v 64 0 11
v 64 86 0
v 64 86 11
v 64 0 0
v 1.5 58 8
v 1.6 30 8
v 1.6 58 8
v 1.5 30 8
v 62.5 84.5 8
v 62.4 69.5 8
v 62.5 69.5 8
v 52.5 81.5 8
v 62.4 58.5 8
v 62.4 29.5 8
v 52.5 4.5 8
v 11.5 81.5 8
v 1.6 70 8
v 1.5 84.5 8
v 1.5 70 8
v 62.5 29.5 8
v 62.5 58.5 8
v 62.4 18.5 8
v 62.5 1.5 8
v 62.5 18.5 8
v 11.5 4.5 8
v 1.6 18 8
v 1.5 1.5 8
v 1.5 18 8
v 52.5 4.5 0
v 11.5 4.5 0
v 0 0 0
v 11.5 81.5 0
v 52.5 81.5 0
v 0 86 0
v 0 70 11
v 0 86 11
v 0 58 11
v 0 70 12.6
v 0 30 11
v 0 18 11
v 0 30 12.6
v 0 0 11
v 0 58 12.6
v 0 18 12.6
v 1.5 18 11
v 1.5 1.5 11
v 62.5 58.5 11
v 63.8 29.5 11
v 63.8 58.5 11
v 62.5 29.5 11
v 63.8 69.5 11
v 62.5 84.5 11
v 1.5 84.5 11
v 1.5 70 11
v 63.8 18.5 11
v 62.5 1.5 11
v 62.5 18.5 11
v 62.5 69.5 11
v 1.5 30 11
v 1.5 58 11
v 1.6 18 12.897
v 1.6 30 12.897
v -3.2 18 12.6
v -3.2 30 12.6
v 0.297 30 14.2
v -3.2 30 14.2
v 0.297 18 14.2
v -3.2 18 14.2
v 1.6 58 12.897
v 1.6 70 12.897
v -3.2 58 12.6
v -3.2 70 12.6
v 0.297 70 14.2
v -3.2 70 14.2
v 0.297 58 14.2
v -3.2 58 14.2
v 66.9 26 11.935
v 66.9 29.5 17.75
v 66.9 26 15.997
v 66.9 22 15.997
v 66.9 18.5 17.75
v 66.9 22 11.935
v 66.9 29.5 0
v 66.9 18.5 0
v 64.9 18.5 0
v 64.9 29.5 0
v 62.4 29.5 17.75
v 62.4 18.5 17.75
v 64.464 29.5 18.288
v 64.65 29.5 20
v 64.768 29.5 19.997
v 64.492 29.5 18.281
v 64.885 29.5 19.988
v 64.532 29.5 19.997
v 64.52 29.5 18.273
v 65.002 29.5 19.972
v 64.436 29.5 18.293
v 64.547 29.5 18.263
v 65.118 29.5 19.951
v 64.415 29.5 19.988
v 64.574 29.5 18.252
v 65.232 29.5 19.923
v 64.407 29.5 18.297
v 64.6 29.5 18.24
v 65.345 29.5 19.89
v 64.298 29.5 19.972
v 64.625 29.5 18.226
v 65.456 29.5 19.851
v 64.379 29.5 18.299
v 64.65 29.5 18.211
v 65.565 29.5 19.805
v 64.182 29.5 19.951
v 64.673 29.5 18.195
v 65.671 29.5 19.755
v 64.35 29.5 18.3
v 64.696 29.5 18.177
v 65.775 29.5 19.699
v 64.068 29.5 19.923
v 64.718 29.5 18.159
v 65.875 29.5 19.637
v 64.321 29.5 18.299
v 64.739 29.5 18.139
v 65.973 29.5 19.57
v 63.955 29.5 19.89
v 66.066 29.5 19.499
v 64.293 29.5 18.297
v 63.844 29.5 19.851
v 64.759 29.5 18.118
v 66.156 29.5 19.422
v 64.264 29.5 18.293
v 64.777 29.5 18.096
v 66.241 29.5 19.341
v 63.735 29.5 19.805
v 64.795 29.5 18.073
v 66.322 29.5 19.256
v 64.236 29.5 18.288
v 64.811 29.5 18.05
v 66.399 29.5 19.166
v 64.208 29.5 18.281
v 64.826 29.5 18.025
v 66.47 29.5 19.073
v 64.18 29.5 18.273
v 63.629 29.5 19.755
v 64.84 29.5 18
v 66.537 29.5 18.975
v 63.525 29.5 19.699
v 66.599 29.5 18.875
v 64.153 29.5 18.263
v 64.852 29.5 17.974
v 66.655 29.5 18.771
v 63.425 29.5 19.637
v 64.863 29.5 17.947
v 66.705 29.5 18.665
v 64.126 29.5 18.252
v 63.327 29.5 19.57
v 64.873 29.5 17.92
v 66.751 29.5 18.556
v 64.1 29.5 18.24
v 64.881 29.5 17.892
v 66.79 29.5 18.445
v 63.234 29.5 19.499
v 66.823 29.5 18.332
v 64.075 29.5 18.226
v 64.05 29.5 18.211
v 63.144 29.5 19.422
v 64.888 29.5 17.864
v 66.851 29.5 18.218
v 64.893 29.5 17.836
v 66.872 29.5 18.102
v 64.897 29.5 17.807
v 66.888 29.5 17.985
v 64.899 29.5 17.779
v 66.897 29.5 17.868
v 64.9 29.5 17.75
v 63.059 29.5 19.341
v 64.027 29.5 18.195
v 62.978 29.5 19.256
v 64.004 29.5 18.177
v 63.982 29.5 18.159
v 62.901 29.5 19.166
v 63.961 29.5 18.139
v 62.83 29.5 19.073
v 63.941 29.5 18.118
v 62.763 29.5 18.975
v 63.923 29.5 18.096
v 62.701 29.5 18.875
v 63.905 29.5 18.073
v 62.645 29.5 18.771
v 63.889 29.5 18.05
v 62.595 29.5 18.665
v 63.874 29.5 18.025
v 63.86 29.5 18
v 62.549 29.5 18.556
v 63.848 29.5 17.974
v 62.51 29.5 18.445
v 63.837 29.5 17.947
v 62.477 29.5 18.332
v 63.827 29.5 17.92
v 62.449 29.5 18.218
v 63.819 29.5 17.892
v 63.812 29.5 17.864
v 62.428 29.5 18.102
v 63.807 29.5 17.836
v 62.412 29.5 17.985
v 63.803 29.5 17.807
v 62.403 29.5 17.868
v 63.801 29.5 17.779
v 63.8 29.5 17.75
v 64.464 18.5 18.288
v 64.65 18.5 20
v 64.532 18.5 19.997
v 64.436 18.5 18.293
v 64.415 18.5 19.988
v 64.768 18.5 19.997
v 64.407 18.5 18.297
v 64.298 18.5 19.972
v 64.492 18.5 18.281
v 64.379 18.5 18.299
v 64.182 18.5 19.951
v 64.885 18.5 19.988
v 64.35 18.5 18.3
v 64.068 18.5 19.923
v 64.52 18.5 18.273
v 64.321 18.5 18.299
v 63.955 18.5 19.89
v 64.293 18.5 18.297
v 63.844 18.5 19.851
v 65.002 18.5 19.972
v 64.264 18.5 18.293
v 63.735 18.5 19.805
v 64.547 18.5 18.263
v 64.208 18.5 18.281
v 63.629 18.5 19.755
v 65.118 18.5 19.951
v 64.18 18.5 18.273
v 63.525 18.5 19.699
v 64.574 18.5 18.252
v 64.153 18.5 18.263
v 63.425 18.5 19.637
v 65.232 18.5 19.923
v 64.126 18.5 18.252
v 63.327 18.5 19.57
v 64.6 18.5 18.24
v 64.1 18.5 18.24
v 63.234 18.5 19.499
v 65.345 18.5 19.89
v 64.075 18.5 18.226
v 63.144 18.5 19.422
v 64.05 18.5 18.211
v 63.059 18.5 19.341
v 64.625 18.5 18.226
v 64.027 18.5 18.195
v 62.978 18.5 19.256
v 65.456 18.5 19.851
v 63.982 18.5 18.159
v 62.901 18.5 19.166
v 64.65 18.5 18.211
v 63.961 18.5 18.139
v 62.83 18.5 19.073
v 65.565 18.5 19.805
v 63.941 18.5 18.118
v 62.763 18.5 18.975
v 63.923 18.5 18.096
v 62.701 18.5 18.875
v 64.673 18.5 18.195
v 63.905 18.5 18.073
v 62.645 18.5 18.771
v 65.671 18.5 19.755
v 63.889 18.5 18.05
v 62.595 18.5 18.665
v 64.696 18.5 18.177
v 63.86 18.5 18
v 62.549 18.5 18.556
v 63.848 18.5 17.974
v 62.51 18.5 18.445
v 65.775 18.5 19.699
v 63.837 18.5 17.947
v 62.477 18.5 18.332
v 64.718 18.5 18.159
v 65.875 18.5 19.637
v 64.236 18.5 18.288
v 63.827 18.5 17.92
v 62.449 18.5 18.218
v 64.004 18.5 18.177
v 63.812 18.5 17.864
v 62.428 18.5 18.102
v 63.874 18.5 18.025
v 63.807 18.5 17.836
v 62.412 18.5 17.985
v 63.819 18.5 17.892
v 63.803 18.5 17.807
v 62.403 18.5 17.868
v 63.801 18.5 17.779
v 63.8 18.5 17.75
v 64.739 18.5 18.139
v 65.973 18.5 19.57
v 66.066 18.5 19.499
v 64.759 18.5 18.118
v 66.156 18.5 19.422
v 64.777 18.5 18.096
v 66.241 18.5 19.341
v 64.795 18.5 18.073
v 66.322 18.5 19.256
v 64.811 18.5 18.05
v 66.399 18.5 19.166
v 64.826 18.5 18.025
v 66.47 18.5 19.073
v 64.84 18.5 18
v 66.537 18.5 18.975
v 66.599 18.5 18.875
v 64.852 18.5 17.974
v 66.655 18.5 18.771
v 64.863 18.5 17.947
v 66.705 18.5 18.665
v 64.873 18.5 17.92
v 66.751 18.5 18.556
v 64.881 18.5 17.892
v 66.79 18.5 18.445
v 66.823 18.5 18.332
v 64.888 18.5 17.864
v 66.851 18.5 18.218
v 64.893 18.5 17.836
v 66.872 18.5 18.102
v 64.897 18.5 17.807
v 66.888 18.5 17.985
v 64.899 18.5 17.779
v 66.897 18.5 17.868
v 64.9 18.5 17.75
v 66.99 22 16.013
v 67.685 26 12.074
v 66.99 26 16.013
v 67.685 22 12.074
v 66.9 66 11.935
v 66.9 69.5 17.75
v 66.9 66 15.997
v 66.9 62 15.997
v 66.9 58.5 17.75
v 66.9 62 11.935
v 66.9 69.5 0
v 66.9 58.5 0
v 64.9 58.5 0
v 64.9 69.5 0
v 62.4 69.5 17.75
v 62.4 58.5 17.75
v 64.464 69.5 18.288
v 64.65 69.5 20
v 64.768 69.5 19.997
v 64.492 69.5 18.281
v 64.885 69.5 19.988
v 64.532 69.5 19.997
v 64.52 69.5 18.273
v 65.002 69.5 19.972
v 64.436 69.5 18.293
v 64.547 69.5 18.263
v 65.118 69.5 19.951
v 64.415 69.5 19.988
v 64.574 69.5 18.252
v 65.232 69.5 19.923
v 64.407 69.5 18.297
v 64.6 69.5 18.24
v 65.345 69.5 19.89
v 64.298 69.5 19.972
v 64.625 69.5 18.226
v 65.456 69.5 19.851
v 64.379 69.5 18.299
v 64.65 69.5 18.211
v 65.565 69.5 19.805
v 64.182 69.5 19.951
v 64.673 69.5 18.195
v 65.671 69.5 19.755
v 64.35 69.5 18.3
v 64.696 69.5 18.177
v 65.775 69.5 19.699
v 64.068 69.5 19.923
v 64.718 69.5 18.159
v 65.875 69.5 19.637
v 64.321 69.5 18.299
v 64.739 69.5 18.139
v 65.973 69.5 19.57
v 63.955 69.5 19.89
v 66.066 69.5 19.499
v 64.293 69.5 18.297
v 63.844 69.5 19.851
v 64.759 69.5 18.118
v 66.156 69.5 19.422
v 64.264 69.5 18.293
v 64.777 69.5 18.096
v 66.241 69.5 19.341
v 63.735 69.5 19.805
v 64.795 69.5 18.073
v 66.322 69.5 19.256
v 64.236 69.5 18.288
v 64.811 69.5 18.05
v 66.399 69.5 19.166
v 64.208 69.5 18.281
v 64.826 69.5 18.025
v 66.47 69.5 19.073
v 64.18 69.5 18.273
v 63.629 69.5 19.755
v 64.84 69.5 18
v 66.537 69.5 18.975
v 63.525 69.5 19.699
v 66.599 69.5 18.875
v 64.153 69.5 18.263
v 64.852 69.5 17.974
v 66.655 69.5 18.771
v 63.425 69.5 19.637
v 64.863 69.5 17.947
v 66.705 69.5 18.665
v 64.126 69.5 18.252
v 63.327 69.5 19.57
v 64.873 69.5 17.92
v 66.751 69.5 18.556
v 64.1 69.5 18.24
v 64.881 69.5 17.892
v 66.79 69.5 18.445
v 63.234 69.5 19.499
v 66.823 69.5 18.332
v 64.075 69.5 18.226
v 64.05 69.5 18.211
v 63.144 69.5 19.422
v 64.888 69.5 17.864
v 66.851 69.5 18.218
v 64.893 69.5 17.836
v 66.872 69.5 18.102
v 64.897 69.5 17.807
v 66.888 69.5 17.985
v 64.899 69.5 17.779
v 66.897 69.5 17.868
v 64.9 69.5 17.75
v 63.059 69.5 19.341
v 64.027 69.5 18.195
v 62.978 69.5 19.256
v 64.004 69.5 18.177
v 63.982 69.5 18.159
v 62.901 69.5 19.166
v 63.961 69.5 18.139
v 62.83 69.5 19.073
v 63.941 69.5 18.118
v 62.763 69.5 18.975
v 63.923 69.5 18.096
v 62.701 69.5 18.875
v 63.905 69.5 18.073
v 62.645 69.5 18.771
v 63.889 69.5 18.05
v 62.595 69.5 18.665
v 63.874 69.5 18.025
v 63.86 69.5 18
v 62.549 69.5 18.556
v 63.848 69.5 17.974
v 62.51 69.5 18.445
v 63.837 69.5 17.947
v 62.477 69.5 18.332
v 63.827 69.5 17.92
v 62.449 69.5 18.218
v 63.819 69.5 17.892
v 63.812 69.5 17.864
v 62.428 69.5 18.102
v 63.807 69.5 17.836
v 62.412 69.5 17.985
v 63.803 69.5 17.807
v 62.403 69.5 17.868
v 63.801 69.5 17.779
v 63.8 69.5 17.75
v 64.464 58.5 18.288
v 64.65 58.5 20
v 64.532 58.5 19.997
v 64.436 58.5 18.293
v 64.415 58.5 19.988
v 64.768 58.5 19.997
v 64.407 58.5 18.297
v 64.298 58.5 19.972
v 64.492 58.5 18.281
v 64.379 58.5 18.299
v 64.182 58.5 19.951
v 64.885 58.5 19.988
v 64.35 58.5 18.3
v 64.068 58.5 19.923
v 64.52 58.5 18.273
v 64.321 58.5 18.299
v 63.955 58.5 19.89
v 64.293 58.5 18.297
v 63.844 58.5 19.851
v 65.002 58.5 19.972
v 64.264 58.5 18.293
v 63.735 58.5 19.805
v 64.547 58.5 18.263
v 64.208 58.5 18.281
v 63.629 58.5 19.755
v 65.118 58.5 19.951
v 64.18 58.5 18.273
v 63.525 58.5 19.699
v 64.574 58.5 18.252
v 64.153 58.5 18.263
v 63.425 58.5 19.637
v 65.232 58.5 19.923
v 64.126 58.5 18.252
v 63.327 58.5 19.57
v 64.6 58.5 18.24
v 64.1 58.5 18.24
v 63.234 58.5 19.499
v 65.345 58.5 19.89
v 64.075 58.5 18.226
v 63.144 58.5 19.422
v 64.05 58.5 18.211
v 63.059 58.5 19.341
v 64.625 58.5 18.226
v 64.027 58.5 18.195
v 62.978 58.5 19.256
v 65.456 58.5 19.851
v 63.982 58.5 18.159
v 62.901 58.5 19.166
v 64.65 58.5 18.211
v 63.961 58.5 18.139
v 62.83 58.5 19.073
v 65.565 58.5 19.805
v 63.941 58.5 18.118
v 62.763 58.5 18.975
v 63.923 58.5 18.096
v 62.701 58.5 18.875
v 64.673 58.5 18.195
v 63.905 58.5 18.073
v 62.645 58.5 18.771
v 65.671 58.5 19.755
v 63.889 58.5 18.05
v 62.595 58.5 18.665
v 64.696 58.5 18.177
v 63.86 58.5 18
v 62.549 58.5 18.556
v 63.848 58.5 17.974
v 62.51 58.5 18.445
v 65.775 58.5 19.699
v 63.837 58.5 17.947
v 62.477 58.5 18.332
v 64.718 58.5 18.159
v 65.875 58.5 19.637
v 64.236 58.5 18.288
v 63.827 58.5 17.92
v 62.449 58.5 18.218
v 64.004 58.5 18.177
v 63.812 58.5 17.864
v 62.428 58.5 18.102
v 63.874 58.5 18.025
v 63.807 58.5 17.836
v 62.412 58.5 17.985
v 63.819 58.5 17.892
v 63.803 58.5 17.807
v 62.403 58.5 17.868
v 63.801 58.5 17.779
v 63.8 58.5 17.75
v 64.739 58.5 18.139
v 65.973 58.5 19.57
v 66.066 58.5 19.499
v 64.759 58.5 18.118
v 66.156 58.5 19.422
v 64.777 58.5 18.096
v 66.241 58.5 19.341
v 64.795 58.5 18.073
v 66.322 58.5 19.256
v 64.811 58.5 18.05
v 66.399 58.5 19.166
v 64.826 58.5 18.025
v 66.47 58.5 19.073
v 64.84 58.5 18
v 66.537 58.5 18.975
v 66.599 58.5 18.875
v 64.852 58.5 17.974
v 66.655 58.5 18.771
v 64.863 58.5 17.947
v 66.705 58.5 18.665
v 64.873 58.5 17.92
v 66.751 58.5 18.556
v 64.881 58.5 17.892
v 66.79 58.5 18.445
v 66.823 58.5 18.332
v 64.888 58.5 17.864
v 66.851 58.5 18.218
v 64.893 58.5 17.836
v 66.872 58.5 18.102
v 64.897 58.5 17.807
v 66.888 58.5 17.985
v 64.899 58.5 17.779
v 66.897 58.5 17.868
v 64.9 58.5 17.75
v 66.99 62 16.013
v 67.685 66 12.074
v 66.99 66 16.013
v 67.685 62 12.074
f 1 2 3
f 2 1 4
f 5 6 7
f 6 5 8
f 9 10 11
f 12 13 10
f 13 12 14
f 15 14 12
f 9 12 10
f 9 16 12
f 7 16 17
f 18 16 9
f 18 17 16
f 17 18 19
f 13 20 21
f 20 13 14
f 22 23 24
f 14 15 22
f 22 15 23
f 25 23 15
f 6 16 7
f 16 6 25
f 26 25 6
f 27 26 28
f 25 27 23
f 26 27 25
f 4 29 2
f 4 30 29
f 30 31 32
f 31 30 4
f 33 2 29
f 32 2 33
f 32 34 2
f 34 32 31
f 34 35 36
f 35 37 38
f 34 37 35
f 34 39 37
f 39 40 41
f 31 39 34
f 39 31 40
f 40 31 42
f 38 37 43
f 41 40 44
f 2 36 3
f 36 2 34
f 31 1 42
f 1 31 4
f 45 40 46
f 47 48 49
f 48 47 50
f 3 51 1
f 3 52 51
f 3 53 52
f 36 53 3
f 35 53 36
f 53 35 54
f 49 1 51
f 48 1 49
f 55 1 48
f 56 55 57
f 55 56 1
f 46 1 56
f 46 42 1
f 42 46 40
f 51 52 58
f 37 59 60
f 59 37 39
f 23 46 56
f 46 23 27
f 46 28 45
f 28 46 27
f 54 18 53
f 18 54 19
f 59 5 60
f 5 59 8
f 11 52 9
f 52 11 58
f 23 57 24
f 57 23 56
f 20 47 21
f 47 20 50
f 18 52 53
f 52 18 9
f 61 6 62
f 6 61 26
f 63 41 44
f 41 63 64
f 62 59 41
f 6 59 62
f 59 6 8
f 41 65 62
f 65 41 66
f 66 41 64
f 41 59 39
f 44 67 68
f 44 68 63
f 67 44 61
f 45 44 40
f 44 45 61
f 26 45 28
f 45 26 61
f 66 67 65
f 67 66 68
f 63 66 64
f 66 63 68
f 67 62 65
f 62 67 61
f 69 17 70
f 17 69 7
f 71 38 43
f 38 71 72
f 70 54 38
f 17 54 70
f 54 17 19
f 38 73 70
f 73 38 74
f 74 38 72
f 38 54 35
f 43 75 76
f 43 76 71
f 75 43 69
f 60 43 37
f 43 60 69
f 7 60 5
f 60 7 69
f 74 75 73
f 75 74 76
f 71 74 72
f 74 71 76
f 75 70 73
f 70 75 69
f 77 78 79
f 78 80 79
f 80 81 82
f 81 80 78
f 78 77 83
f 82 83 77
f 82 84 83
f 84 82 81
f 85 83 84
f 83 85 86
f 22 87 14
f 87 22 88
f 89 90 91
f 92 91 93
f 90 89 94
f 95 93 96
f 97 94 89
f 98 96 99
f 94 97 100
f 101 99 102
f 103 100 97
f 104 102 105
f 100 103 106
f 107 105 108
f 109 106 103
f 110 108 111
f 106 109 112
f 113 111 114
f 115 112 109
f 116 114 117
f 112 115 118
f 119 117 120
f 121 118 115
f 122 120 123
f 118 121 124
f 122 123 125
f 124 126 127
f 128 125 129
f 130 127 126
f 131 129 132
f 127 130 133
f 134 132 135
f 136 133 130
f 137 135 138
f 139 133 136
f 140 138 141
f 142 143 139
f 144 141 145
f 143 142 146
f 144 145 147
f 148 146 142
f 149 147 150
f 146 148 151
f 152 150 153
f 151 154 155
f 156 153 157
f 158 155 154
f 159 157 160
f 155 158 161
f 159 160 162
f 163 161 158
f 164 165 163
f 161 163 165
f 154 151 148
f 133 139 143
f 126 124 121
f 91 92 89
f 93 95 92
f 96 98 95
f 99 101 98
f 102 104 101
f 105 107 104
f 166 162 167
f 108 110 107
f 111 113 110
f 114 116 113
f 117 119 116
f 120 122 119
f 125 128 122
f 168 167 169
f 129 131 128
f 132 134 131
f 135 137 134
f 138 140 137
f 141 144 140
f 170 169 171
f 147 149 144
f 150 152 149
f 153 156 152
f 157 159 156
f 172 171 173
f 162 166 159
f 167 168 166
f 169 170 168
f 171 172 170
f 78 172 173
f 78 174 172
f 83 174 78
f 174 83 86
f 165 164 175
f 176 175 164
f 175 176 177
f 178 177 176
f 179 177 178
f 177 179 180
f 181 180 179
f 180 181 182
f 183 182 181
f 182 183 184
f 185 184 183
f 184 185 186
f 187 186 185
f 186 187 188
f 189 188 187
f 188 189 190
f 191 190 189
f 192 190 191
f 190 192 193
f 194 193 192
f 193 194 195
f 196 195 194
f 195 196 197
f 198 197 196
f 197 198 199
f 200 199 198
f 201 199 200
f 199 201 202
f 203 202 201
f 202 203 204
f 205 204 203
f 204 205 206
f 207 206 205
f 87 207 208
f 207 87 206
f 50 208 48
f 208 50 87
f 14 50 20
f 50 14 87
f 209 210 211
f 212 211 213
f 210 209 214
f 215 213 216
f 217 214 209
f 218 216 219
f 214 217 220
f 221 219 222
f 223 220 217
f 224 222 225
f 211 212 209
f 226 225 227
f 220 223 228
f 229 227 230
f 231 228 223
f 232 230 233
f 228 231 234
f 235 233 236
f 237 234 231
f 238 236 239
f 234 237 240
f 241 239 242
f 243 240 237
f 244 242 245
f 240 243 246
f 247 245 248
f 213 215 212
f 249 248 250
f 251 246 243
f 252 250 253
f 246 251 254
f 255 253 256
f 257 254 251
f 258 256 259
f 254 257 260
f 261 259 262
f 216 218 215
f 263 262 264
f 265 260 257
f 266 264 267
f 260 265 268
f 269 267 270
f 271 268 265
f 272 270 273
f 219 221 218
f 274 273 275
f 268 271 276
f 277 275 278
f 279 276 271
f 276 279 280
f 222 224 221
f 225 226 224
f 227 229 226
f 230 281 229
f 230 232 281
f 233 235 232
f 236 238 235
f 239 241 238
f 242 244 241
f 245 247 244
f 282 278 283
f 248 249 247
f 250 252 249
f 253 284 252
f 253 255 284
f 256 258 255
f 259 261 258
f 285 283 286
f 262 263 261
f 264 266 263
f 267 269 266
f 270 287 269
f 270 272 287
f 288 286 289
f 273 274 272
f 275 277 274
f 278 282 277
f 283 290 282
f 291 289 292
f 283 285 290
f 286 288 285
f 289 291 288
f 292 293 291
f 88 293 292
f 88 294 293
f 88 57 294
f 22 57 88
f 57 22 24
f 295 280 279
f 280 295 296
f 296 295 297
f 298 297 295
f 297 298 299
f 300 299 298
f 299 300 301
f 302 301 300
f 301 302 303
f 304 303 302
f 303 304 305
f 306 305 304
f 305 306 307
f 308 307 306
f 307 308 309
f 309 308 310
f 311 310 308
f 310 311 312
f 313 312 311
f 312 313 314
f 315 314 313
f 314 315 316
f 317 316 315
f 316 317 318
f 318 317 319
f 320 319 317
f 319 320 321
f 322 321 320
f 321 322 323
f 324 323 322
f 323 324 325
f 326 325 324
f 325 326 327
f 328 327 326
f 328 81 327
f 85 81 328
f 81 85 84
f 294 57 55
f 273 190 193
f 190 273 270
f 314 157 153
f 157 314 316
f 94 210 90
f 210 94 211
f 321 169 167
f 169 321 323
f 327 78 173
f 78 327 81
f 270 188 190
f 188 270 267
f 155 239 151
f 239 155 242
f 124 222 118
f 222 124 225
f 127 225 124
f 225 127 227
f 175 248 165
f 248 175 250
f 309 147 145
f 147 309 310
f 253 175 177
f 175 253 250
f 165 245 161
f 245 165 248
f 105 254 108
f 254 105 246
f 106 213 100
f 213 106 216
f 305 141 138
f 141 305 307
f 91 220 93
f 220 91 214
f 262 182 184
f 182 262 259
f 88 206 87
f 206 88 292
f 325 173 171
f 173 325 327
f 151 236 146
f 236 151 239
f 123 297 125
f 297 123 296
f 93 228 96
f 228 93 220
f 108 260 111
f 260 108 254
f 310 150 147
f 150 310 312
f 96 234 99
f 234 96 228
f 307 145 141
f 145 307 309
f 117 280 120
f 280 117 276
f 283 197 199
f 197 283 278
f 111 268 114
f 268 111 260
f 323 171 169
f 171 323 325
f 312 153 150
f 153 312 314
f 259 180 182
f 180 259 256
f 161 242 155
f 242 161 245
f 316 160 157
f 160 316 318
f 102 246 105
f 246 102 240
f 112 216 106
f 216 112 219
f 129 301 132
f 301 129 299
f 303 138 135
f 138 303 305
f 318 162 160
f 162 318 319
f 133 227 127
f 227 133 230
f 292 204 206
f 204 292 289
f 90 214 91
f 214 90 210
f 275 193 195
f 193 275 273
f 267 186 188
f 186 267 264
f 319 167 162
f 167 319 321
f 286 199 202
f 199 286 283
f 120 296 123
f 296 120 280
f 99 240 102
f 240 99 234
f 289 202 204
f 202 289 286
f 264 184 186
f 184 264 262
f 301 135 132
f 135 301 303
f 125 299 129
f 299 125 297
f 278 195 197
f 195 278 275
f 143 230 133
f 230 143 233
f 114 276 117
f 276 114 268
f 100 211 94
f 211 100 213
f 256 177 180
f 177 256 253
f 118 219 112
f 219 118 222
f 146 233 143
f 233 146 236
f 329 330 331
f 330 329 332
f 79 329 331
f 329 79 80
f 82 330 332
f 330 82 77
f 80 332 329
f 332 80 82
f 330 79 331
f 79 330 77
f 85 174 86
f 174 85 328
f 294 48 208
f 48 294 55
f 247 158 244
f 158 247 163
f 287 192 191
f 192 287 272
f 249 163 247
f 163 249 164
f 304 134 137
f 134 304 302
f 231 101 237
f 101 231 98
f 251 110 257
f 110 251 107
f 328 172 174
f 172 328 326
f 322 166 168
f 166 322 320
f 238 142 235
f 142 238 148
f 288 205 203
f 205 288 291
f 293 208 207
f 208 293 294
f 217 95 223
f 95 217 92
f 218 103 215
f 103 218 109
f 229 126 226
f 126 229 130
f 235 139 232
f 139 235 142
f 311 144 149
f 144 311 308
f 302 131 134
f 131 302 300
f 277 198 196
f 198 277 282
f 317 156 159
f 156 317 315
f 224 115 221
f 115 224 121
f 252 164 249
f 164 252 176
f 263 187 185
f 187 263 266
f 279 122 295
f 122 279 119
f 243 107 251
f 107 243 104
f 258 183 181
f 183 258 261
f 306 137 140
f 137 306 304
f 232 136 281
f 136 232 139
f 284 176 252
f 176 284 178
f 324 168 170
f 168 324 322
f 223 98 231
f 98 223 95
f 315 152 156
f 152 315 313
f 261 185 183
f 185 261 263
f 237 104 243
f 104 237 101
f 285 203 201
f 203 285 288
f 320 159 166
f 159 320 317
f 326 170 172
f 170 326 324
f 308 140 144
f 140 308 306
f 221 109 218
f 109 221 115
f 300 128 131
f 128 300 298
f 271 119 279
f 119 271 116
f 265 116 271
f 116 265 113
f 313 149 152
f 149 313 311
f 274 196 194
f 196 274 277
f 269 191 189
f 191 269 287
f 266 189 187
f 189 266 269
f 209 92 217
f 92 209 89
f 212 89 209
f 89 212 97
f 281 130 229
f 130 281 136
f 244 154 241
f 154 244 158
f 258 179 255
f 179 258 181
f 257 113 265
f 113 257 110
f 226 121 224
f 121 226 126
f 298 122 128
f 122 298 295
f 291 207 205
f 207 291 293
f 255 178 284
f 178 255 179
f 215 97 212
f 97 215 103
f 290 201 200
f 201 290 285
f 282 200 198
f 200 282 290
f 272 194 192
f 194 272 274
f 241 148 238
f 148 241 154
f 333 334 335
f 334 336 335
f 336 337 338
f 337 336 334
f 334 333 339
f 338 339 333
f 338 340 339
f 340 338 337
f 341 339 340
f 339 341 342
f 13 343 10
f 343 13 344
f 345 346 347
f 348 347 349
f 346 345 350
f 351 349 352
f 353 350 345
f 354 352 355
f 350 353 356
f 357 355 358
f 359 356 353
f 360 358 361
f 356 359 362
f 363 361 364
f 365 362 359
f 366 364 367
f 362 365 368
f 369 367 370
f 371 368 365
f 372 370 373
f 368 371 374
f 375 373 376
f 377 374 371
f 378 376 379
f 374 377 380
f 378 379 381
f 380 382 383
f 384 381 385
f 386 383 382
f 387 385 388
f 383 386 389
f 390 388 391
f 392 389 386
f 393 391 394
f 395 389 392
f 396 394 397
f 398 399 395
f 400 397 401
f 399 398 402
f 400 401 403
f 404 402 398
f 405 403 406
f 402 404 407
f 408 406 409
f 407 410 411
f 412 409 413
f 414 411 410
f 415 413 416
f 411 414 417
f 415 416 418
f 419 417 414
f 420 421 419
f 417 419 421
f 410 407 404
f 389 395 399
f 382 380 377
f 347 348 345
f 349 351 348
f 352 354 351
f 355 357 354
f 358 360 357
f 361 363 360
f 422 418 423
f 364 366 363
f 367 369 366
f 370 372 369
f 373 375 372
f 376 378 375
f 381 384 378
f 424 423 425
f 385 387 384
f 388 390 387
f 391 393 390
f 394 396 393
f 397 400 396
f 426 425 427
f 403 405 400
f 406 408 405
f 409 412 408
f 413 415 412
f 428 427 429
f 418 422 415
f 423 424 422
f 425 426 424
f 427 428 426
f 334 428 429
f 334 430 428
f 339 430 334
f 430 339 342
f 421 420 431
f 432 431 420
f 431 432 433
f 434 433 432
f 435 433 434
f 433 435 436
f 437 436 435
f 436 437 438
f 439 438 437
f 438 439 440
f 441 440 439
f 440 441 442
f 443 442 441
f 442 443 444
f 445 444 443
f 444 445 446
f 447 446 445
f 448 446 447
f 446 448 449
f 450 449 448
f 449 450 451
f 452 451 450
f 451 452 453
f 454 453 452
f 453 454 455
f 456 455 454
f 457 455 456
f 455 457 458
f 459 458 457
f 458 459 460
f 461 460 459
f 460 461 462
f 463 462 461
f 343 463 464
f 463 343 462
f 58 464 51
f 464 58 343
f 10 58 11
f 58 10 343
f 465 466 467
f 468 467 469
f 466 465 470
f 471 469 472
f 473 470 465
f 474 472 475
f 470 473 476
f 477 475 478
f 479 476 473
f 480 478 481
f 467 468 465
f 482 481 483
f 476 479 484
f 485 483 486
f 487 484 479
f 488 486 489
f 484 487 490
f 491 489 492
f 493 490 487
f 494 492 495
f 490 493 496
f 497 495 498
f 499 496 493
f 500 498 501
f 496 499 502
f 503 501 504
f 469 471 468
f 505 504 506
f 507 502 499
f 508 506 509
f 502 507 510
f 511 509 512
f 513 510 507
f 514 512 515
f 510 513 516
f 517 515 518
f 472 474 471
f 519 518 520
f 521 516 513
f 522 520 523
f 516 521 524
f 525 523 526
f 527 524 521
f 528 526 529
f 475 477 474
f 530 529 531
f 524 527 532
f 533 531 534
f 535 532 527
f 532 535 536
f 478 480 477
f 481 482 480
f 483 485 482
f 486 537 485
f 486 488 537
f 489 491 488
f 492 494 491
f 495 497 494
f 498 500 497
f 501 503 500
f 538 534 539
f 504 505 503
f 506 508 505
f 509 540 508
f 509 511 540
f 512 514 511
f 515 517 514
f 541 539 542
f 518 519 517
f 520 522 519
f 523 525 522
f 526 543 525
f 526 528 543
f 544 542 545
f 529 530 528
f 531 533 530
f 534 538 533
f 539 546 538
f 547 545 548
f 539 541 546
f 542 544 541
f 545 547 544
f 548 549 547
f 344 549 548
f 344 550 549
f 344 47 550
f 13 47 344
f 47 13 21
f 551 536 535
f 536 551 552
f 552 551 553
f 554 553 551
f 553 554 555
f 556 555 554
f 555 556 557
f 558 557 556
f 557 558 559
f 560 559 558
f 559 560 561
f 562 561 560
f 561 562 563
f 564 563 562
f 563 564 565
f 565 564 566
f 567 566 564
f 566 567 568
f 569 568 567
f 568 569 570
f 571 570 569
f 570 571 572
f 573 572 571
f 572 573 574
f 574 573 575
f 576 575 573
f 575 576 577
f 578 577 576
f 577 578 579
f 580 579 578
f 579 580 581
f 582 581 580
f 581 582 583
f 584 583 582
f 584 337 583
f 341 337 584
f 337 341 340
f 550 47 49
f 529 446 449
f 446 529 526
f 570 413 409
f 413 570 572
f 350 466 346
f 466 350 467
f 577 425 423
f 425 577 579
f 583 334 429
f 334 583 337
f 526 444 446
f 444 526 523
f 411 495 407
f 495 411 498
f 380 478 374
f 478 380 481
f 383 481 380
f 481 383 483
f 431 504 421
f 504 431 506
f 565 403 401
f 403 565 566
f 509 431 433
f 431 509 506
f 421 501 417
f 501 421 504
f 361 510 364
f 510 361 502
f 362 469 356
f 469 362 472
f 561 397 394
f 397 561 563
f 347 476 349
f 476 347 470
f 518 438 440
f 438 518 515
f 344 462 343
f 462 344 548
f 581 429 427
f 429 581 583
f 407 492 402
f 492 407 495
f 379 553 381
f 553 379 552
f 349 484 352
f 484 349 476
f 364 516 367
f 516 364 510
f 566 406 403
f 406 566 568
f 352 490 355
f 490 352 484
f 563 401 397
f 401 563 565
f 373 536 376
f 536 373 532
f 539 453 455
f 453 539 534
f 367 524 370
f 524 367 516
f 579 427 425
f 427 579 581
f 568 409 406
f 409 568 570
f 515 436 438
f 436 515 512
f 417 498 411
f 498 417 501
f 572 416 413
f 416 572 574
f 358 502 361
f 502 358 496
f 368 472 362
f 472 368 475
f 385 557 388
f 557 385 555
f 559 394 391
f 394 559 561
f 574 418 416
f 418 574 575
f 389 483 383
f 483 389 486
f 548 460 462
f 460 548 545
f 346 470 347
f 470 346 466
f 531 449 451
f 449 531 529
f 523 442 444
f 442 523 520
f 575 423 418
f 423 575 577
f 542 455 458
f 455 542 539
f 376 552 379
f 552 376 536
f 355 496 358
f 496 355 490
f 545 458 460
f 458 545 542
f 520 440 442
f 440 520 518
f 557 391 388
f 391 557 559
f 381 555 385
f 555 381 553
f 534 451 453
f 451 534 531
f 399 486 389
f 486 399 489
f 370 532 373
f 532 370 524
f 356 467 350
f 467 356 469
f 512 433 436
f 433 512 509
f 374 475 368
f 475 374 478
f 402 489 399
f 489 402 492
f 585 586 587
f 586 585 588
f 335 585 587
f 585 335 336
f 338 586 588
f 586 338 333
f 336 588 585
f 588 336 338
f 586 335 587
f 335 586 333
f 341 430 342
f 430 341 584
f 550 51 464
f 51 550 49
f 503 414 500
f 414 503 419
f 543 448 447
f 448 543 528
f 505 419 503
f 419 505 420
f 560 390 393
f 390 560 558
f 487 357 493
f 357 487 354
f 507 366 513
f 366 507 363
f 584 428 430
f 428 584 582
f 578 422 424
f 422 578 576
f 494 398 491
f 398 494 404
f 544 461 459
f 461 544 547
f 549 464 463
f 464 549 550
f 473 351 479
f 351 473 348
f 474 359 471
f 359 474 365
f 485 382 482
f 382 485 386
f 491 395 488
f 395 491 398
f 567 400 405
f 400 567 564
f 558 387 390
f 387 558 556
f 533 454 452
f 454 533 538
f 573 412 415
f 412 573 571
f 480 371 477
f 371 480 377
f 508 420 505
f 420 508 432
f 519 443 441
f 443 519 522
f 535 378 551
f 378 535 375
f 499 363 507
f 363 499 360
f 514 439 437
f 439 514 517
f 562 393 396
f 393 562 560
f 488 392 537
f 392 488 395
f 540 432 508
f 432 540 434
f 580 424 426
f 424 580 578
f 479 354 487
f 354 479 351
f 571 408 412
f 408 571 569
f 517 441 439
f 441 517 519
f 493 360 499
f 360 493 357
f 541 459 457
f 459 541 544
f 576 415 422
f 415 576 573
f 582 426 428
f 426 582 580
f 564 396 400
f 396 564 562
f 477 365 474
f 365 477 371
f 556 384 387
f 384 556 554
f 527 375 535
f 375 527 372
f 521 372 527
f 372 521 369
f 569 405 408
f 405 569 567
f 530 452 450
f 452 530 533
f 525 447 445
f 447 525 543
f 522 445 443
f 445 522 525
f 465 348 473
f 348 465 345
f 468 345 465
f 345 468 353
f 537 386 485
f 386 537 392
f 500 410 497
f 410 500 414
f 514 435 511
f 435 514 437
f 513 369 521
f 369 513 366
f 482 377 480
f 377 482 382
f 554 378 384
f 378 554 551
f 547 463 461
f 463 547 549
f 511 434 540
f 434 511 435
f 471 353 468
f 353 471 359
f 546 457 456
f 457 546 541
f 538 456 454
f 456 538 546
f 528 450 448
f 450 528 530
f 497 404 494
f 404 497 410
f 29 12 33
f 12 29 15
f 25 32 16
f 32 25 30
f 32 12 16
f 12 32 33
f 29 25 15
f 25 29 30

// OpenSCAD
// ramecek
fullx = 64;
fully = 86;
fullz = 8;
// klec na 2x LiIon 18650
bkx = 41;
bky = 77;
bkz = 23;
// obrysovy ramecek
orstena = 1.5;
orz = 3;

// kontakt baterie na strane pevnych uchytu
batxminus = 8;
batxplus = 5.8;
batx = 2.8;
baty = 7;
batyminus = 7.8;
batyplus = 80;
batz = 15;
batzzero = 7.8;

// ohyby pro pant 
pantypos1 = 24;
pantypos2 = 64;
panty = 12;
pantd = 1.6;
panto = 1.5;
pantz = fullz+orz+pantd;

// spony: obracene U vyska 9mm, sirka 12mm hloubka 5mm
sponax = 4.5;
sponay = 11;
sponaz = 9;
sponad = 1.7;


posxvypl = (fullx - bkx)/2;
posyvypl = (fully - bky)/2;
poszvypl = 0;

module zaklblok() {
   cube([fullx,fully,fullz]);
   translate([0,0,fullz]) { cube([fullx,orstena,orz]);}
   translate([0,0,fullz]) { cube([orstena,fully,orz]);}
   translate([fullx-orstena,0,fullz]) { cube([orstena,fully,orz]);}
   translate([0,fully-orstena,fullz]) { cube([fullx,orstena,orz]);}
}

module batpol() { 
   difference() {
     union() {
       cube([batx,baty,batz]);
     } // zakladni cast    
     union() {
       // otvor
       translate([0,baty/2,3*batz/4]) rotate([0,270,0]) cylinder($fn=120,center=true,d=1.95,h=baty);
     } // odebirane casti
   }
}

module batconn() {
   // minus pol 
   translate([batxminus,batyminus - baty/2,batzzero]) batpol();
   // plus pol  
   translate([batxplus,(batyplus-baty/2),batzzero]) batpol();
}

module pant() {
  difference() {
    union() {
      cube([pantd,panty,pantz]);
      translate([-2*pantd,0,pantz]) cube([3*pantd,panty,pantd]); 
    }
    union() {
    translate([-pantd*0.1,0,pantz+2.7*pantd]) rotate([0,135,0]) cube([pantd,panty,pantd*2.7]);
    }
  }  
}
  
module panty() {
   translate([0,pantypos1 - panty/2,0]) pant();
   translate([0,pantypos2 - panty/2,0]) pant();
}

module spony() {
 translate([fullx-pantd,pantypos1 - sponay/2,0]) spona();
 translate([fullx-pantd,pantypos2 - sponay/2,0]) spona();   
}
module spona() {
    difference() {
      union() {  // plna cast
        cube([sponax,sponay,fullz+orz+sponaz-sponax/2]);
        translate([sponax/2,0,fullz+orz+sponaz-sponax/2])
          rotate([270,0,0])
            cylinder(h=sponay,d=sponax,$fn=120);
        translate([sponax-0.2,sponay/2-2,fullz+orz+0.9])
          rotate([0,-10,0])
            cube([1,4,4]);
      }
      union() {  // odebrana cast
        translate([sponax/2-sponad/2,0,0]) {
          cube([sponax-2*sponad,sponay,fullz+orz+sponaz-sponax/2]);
          translate([sponax/2-sponad,0,fullz+orz+sponaz-sponax/2])
            rotate([270,0,0])
              cylinder(h=sponay,d=sponax-2*sponad,$fn=120);  
        }
       }              
      }
}

module drzak() { 
difference() {
  union(){  
    zaklblok();
    //batconn();  
    panty();
    spony();  
   }  
  union() {
    //panty();
    //spony();  
    translate([posxvypl,posyvypl,poszvypl])
      cube([fullx-2*posxvypl,fully-2*posyvypl,fullz]);
      }
  }
}
  
//batpol();
drzak();
//translate([1.1*fullx,20,0]) rotate([90,0,0]) pant();
//translate([1.1*fullx,40,0]) rotate([90,0,0]) pant();
//translate([1.1*fullx,63,0]) rotate([90,0,0]) spona();
//translate([1.1*fullx,86,0]) rotate([90,0,0]) spona();
